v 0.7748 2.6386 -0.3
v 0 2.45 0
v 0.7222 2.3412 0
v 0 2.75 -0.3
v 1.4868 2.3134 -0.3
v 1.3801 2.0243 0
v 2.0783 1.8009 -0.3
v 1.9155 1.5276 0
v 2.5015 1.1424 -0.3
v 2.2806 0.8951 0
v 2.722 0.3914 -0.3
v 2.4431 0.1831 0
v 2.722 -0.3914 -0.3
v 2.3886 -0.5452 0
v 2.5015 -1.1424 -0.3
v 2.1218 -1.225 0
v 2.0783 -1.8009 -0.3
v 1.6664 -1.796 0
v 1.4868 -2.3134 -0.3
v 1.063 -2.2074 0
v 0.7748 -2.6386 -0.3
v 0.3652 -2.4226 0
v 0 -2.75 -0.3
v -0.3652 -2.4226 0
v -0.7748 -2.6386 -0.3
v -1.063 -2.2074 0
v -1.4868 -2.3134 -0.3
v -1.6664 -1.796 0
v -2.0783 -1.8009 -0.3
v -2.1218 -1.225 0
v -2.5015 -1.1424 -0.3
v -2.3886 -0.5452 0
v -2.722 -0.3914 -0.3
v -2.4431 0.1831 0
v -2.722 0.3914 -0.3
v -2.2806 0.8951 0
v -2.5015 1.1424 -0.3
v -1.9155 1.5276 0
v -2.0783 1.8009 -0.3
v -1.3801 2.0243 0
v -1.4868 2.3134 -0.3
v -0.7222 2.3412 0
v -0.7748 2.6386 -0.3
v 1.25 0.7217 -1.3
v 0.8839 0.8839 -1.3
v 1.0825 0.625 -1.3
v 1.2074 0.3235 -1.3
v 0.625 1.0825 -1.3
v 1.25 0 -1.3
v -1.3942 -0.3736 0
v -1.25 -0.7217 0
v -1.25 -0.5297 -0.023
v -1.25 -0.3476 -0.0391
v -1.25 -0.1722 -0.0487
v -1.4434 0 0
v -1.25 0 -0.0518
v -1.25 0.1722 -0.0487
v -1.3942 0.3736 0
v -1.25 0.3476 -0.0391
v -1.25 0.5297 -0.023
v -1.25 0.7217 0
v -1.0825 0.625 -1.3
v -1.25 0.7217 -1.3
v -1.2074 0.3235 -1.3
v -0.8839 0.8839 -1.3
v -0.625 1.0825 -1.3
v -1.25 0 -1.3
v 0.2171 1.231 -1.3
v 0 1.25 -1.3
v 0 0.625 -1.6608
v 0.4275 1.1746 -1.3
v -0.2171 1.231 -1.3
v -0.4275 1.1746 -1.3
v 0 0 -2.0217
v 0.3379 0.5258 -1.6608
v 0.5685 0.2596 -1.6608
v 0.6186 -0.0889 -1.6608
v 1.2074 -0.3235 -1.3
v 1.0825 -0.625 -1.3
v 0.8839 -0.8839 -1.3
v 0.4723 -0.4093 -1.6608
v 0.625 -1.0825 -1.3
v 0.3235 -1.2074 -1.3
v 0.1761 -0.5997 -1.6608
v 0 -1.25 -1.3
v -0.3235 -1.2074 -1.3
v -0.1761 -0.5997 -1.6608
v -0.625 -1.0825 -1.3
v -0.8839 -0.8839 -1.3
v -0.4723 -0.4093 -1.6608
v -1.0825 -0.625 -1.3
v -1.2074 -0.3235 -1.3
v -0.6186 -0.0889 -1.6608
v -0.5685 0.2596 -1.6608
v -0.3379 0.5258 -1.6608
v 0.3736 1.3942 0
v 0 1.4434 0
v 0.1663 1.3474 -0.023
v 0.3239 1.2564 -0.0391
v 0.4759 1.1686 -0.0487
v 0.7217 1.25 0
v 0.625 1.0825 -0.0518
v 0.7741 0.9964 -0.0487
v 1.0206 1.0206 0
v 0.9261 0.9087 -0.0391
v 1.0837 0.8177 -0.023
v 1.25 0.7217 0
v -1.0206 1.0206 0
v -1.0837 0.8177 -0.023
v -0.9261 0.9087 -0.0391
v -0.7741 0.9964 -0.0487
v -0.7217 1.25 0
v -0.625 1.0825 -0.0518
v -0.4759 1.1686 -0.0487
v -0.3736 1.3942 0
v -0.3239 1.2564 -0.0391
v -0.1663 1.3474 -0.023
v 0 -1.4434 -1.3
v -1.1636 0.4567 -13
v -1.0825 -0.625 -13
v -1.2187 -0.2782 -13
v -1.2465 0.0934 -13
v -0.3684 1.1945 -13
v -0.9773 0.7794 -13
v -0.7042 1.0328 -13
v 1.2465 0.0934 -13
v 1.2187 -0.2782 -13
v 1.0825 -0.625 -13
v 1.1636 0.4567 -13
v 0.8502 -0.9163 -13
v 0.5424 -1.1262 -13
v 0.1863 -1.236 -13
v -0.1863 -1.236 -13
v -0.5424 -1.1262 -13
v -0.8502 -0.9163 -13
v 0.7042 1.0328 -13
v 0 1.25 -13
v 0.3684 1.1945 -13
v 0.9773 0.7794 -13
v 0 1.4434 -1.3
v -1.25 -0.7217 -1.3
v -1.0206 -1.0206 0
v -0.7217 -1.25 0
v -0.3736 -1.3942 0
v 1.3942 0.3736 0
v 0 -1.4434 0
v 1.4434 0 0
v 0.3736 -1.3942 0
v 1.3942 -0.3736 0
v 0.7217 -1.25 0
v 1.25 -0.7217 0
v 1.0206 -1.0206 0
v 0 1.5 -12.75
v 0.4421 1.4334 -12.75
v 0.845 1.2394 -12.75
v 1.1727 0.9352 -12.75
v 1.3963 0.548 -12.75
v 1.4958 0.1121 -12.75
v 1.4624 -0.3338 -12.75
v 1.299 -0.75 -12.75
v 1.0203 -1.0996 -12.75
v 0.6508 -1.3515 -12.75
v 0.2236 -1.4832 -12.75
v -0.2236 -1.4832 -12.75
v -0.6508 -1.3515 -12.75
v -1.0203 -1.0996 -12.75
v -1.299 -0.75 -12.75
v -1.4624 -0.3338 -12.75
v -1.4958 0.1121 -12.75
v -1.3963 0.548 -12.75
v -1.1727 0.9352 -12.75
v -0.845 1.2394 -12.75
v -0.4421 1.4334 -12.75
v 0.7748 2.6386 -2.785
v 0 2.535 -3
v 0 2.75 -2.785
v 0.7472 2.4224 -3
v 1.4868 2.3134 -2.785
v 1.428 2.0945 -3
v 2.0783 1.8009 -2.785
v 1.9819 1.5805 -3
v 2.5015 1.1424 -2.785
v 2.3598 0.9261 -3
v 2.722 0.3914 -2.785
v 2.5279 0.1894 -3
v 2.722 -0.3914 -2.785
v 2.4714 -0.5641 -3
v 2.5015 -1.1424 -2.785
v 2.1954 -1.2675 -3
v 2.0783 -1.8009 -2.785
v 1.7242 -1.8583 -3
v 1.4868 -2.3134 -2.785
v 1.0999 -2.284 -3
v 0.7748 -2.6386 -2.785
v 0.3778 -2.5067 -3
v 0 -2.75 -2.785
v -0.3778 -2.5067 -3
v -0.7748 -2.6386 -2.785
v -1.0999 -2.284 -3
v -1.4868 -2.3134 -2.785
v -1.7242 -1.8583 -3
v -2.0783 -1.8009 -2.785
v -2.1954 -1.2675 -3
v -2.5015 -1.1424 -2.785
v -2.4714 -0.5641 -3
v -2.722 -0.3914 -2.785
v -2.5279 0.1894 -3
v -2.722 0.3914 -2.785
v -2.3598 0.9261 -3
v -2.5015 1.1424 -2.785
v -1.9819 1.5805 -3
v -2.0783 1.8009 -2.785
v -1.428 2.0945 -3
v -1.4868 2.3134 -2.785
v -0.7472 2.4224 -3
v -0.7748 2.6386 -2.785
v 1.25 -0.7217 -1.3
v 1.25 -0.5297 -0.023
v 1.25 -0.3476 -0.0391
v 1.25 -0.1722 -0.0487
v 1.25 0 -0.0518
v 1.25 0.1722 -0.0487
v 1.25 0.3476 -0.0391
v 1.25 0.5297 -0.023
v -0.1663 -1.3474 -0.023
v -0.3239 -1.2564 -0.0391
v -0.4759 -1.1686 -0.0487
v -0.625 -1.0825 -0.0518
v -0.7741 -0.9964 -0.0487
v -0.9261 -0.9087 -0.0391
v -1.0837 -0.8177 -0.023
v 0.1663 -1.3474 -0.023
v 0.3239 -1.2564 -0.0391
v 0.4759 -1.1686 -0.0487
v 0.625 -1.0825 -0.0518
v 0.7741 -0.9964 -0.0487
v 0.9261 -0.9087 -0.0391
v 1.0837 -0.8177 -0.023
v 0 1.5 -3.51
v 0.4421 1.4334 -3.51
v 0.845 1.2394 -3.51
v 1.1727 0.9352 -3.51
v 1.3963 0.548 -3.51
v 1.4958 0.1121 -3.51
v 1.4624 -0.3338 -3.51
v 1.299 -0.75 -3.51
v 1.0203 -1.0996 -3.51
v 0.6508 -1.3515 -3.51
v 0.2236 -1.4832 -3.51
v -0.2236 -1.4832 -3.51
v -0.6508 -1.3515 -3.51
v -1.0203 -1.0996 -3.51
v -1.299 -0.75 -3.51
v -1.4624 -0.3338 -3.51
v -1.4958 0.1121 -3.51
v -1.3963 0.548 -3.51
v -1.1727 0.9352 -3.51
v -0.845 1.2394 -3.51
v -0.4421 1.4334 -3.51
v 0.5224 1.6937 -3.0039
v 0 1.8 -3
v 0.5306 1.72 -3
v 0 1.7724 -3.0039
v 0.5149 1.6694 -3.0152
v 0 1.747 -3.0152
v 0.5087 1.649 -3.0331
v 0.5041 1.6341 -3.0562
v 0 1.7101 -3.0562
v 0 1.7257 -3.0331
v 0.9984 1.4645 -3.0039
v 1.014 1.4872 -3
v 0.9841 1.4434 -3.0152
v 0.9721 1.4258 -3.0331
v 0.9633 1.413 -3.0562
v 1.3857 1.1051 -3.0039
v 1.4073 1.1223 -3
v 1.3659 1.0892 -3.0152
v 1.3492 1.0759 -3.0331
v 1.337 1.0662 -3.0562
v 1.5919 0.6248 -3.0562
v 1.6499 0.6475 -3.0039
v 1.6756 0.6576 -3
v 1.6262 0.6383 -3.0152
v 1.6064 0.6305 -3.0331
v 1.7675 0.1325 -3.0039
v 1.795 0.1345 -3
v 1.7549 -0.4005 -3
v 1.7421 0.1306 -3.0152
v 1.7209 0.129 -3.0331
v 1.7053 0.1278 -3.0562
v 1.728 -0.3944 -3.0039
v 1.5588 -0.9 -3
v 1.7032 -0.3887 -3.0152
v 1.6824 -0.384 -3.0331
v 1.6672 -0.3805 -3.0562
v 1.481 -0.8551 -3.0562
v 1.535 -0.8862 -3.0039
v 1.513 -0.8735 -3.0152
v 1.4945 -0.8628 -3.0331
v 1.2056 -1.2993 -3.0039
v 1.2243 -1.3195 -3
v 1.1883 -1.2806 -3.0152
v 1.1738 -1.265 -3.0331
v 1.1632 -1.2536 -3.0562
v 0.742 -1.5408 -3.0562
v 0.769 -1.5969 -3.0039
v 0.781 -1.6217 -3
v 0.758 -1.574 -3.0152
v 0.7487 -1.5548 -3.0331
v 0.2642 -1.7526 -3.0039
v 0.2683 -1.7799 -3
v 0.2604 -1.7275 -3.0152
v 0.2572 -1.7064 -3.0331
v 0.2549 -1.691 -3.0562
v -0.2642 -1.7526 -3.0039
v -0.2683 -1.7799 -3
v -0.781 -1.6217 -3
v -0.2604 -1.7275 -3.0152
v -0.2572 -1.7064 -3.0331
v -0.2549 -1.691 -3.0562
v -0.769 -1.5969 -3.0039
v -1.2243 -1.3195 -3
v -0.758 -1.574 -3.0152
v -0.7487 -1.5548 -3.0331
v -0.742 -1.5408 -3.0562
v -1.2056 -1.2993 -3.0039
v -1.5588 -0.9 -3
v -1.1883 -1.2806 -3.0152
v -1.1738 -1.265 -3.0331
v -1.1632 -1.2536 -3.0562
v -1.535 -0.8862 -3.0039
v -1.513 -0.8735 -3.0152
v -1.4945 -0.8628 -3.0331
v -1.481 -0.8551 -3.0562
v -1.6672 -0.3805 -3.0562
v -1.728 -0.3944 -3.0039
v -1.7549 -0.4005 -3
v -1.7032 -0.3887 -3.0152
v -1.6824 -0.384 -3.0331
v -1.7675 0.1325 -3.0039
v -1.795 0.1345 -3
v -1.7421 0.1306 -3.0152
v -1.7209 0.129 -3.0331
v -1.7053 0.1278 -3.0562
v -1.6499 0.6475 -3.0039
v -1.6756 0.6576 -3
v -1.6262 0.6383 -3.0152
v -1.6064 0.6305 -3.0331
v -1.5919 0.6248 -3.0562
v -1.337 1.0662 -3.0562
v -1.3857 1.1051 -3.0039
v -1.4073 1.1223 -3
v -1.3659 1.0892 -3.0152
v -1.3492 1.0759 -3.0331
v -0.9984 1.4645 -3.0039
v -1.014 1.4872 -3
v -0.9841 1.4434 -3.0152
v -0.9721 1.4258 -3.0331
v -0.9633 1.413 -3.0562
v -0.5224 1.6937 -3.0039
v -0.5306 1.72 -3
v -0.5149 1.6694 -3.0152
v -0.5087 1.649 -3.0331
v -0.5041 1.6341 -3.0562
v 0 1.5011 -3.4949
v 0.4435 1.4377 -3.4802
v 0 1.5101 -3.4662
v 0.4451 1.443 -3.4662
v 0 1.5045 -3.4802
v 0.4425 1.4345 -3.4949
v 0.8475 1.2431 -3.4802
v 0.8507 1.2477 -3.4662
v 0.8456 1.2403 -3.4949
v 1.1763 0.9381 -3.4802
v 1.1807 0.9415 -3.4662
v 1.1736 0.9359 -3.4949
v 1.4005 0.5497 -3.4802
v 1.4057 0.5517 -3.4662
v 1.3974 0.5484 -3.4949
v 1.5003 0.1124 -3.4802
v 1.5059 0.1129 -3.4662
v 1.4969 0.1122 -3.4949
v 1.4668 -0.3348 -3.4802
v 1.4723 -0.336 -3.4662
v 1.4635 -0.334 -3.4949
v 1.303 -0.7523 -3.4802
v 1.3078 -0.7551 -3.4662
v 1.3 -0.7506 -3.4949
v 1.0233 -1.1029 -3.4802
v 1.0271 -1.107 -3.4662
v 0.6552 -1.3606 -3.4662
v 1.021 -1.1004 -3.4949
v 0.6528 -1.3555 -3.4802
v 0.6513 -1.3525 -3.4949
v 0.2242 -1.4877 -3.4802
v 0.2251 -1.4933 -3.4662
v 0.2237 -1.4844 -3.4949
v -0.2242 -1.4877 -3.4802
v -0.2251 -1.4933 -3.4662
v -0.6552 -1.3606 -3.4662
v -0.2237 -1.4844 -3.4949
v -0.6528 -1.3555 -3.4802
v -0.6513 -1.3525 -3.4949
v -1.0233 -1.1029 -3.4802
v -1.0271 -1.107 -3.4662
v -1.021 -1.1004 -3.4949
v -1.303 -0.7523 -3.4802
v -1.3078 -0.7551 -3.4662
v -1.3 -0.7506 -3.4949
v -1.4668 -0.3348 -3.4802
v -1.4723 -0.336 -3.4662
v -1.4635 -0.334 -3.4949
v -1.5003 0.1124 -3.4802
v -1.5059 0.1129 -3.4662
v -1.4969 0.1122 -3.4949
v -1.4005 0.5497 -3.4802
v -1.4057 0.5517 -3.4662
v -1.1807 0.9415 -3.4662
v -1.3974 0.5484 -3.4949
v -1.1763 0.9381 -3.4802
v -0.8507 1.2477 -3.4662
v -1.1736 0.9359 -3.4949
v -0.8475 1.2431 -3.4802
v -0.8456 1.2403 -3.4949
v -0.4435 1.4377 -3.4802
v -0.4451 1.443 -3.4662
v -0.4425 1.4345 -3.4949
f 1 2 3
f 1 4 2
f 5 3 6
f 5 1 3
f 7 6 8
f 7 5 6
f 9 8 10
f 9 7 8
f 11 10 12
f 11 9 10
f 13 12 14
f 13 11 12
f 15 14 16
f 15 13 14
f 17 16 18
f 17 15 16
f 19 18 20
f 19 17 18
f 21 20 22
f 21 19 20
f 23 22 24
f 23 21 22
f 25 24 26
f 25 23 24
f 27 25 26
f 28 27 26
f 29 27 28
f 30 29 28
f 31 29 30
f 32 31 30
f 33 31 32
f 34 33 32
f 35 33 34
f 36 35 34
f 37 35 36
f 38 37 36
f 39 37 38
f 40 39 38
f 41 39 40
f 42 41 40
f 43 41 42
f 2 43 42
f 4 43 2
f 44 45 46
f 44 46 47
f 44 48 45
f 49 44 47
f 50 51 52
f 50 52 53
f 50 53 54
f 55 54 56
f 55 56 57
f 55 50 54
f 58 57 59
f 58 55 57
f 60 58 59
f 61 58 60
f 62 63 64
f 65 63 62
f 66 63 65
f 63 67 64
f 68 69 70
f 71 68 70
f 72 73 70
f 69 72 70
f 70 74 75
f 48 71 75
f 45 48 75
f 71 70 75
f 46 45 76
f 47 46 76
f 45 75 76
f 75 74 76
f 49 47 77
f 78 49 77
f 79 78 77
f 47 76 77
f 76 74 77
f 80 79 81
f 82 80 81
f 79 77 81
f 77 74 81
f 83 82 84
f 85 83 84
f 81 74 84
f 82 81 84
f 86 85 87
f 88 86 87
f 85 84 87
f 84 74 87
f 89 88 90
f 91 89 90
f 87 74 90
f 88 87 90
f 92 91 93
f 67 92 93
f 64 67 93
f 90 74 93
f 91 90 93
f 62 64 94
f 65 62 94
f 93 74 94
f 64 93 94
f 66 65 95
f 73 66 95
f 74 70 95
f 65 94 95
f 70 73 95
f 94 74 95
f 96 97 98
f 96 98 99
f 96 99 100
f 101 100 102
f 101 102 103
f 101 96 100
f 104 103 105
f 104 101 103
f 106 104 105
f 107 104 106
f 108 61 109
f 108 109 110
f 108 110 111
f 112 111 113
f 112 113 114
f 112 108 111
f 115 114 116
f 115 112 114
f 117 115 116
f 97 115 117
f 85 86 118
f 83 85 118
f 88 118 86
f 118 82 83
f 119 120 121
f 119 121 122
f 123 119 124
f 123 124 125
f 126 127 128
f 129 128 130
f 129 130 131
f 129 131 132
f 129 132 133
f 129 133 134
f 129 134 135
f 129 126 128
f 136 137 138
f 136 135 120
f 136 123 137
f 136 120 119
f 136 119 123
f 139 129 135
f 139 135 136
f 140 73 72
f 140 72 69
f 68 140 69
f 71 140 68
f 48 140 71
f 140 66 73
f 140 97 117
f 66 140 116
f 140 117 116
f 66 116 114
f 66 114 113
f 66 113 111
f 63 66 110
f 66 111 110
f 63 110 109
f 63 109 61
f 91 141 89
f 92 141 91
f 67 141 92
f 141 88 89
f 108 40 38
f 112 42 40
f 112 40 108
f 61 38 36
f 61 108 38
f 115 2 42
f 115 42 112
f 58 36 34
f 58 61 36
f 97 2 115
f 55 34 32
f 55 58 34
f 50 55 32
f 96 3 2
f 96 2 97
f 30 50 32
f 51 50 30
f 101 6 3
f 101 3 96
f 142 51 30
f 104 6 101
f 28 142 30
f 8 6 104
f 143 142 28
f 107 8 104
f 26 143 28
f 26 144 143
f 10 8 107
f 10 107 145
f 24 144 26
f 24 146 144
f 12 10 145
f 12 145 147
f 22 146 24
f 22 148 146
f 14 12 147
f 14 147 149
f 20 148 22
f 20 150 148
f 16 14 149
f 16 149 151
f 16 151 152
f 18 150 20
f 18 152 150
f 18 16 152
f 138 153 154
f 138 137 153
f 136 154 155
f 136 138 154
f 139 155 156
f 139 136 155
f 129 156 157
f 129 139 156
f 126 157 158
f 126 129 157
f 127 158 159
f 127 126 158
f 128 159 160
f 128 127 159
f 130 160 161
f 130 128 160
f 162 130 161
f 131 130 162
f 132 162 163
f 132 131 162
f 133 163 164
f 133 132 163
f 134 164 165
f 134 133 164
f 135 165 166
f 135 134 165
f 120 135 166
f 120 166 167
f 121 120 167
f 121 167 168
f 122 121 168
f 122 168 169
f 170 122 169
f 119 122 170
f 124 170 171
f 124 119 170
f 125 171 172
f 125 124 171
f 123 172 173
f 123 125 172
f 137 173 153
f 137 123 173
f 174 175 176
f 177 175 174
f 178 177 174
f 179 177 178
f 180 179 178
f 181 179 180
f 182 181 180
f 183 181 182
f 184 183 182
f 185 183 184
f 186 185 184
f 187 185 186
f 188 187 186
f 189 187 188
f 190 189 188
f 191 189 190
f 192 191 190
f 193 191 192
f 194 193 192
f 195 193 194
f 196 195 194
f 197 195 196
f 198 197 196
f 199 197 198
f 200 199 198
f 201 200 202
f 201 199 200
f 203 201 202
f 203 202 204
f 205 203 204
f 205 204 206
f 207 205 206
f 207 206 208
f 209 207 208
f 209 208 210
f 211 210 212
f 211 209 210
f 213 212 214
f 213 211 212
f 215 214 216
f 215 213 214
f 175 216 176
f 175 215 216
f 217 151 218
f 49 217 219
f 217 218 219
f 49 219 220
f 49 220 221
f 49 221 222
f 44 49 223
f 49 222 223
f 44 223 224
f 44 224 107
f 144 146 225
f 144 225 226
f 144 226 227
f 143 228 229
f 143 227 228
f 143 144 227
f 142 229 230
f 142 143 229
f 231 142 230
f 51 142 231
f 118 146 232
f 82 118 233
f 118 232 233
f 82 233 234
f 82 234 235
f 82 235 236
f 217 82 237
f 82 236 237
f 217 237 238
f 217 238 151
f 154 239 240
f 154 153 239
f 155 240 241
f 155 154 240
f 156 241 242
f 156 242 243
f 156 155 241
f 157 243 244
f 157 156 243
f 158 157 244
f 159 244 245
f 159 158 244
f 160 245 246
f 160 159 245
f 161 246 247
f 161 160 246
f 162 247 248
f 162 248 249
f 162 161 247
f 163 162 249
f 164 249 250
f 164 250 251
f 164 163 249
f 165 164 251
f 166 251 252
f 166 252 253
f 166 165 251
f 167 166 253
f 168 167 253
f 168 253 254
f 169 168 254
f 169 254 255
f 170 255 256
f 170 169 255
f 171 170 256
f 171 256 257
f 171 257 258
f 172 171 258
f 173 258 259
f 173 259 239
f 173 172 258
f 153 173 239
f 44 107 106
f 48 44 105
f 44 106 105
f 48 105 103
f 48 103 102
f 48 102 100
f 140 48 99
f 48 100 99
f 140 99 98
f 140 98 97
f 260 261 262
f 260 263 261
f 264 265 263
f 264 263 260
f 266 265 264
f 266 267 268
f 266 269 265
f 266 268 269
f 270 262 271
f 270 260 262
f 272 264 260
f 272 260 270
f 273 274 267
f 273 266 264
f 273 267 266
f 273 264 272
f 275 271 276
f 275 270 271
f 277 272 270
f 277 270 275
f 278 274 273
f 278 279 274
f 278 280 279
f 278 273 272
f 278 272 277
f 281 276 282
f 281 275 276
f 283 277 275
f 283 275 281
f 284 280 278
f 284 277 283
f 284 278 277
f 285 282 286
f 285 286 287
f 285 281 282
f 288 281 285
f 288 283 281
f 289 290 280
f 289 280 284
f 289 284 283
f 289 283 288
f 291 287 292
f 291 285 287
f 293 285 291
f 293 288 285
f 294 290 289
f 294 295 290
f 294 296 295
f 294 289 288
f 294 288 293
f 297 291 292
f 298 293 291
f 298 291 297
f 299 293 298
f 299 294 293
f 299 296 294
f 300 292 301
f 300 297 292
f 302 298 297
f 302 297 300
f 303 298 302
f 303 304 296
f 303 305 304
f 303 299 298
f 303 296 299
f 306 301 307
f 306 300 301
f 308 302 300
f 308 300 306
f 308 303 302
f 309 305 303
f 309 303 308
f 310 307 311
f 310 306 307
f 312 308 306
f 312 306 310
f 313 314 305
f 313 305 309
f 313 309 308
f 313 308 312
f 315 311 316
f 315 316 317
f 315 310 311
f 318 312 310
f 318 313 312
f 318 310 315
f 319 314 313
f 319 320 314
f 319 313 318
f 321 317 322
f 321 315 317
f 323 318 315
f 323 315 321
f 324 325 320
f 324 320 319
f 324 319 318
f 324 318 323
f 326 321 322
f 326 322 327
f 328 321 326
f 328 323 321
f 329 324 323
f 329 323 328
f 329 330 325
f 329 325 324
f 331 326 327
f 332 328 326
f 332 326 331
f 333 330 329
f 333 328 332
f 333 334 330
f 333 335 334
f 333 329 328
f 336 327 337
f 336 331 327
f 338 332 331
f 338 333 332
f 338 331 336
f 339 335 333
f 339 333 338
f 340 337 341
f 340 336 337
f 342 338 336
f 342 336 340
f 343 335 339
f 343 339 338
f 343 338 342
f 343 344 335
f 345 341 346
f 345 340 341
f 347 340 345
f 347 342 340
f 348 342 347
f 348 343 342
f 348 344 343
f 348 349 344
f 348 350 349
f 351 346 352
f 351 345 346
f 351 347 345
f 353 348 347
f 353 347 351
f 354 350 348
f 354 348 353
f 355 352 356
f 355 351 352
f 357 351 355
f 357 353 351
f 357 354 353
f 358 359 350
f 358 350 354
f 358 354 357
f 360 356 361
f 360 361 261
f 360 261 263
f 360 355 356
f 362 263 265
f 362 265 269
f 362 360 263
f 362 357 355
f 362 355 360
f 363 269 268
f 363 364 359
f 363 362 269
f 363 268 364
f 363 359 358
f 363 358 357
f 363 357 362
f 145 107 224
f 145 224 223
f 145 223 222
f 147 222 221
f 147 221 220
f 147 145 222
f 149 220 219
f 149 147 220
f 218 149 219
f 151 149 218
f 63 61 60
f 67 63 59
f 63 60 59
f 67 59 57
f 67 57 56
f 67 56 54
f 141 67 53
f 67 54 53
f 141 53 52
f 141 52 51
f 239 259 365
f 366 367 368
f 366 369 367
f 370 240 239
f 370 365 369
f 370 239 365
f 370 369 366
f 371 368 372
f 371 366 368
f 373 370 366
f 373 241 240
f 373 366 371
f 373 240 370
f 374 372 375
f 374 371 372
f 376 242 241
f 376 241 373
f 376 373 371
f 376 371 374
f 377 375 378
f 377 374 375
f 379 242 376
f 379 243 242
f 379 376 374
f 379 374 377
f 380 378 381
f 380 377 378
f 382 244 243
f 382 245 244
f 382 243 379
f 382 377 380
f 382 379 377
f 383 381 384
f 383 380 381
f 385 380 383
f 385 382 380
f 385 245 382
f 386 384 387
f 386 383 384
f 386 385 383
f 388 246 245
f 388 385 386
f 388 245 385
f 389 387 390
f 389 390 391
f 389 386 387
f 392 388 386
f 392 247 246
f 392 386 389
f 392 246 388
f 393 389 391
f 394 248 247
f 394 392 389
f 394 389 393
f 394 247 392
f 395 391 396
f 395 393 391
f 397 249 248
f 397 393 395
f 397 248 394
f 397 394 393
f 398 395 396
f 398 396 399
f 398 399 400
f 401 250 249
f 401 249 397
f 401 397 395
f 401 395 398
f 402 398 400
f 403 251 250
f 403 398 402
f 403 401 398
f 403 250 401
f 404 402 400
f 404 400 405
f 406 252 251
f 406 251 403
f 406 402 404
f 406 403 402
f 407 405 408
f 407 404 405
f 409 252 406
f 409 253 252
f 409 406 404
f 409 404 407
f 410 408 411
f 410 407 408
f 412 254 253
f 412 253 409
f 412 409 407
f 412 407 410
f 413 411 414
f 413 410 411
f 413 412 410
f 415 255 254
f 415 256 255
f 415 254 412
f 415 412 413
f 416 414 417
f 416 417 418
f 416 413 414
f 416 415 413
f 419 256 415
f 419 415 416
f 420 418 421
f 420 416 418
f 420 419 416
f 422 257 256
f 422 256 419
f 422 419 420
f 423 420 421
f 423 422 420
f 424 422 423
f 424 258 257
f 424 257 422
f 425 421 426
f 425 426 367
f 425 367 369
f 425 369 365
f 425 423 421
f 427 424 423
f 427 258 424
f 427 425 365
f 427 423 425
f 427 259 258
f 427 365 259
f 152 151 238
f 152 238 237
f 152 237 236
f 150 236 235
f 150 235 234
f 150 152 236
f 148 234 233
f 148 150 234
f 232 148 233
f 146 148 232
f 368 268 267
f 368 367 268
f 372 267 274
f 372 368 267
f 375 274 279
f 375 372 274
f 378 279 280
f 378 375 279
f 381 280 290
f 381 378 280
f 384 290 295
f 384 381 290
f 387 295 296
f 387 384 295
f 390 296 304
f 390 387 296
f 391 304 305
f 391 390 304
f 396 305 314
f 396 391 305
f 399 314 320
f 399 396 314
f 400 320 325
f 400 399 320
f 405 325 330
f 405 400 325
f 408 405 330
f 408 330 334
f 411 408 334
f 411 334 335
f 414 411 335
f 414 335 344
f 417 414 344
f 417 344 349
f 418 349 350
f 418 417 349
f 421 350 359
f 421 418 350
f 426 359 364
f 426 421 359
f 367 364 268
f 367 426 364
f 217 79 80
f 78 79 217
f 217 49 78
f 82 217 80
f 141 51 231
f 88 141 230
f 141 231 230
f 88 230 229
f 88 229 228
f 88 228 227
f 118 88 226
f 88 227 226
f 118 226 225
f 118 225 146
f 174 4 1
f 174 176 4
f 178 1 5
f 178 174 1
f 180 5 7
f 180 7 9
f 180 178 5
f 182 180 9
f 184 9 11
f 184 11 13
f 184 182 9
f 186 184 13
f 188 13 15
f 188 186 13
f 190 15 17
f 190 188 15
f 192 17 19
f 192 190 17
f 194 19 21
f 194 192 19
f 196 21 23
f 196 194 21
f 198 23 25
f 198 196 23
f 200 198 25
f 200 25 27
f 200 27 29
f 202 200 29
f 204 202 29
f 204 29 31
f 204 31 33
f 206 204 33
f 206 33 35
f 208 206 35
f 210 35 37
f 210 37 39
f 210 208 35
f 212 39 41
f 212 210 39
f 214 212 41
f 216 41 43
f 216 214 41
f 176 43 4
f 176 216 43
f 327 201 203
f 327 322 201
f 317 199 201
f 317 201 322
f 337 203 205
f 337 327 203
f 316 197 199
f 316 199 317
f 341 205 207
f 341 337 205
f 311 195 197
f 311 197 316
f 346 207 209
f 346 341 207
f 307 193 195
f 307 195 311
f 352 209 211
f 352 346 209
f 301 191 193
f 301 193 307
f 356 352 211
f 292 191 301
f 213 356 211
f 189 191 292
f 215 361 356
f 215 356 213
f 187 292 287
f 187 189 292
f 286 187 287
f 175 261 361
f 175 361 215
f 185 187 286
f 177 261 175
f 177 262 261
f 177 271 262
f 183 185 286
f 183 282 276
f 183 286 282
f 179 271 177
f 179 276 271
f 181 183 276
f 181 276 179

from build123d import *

# Parameters (mm, degrees)
CUT_EXTRUDE1_DEPTH = 1.3


with BuildPart() as part:
    # Sketch1 → Revolve1 (revolve)
    with BuildSketch(Plane(origin=(0, 0, 0), x_dir=(0, 0, -1), z_dir=(1, 0, 0))):
        with BuildLine():
            Line((0, 0), (0, 2.45))
            Line((0, 2.45), (0.3, 2.75))
            Line((0.3, 2.75), (2.785, 2.75))
            Line((2.785, 2.75), (3, 2.535))
            Line((3, 2.535), (3, 1.8))
            ThreePointArc((3, 1.8), (3.015193643, 1.74701055), (3.056157637, 1.710123155))
            Line((3.056157637, 1.710123155), (3.466157637, 1.510123155))
            ThreePointArc((3.466157637, 1.510123155), (3.48750205, 1.50256365), (3.51, 1.5))
            Line((3.51, 1.5), (12.75, 1.5))
            Line((12.75, 1.5), (13, 1.25))
            Line((13, 1.25), (13, 0))
            Line((13, 0), (0, 0))
        make_face()
    revolve(axis=Axis((0, 0, 0), (0, 0, -1)))

    # Sketch2 → Cut-Extrude1 (cut)
    with BuildSketch(Plane.XY):
        Polygon((0, 1.443375673), (-1.25, 0.721687836), (-1.25, -0.721687836), (0, -1.443375673), (1.25, -0.721687836), (1.25, 0.721687836), align=None)
    extrude(amount=-CUT_EXTRUDE1_DEPTH, mode=Mode.SUBTRACT)

    # Sketch3 → Cut-Revolve2 (revolve, cut)
    with BuildSketch(Plane(origin=(0, 0, 0), x_dir=(0, 0, -1), z_dir=(1, 0, 0))):
        Polygon((1.3, 0), (1.3, 1.25), (2.021687836, 0), align=None)
    revolve(axis=Axis((0, 0, -1.3), (0, 0, -1)), mode=Mode.SUBTRACT)

    # Sketch4 → Cut-Revolve3 (revolve, cut)
    with BuildSketch(Plane(origin=(0, 0, 0), x_dir=(0, 0, -1), z_dir=(1, 0, 0))):
        Polygon((0, 1.443375673), (0, 1.25), (0.051814855, 1.25), align=None)
    revolve(axis=Axis((0, 0, 0), (0, 0, -1)), mode=Mode.SUBTRACT)


solid = part.part
